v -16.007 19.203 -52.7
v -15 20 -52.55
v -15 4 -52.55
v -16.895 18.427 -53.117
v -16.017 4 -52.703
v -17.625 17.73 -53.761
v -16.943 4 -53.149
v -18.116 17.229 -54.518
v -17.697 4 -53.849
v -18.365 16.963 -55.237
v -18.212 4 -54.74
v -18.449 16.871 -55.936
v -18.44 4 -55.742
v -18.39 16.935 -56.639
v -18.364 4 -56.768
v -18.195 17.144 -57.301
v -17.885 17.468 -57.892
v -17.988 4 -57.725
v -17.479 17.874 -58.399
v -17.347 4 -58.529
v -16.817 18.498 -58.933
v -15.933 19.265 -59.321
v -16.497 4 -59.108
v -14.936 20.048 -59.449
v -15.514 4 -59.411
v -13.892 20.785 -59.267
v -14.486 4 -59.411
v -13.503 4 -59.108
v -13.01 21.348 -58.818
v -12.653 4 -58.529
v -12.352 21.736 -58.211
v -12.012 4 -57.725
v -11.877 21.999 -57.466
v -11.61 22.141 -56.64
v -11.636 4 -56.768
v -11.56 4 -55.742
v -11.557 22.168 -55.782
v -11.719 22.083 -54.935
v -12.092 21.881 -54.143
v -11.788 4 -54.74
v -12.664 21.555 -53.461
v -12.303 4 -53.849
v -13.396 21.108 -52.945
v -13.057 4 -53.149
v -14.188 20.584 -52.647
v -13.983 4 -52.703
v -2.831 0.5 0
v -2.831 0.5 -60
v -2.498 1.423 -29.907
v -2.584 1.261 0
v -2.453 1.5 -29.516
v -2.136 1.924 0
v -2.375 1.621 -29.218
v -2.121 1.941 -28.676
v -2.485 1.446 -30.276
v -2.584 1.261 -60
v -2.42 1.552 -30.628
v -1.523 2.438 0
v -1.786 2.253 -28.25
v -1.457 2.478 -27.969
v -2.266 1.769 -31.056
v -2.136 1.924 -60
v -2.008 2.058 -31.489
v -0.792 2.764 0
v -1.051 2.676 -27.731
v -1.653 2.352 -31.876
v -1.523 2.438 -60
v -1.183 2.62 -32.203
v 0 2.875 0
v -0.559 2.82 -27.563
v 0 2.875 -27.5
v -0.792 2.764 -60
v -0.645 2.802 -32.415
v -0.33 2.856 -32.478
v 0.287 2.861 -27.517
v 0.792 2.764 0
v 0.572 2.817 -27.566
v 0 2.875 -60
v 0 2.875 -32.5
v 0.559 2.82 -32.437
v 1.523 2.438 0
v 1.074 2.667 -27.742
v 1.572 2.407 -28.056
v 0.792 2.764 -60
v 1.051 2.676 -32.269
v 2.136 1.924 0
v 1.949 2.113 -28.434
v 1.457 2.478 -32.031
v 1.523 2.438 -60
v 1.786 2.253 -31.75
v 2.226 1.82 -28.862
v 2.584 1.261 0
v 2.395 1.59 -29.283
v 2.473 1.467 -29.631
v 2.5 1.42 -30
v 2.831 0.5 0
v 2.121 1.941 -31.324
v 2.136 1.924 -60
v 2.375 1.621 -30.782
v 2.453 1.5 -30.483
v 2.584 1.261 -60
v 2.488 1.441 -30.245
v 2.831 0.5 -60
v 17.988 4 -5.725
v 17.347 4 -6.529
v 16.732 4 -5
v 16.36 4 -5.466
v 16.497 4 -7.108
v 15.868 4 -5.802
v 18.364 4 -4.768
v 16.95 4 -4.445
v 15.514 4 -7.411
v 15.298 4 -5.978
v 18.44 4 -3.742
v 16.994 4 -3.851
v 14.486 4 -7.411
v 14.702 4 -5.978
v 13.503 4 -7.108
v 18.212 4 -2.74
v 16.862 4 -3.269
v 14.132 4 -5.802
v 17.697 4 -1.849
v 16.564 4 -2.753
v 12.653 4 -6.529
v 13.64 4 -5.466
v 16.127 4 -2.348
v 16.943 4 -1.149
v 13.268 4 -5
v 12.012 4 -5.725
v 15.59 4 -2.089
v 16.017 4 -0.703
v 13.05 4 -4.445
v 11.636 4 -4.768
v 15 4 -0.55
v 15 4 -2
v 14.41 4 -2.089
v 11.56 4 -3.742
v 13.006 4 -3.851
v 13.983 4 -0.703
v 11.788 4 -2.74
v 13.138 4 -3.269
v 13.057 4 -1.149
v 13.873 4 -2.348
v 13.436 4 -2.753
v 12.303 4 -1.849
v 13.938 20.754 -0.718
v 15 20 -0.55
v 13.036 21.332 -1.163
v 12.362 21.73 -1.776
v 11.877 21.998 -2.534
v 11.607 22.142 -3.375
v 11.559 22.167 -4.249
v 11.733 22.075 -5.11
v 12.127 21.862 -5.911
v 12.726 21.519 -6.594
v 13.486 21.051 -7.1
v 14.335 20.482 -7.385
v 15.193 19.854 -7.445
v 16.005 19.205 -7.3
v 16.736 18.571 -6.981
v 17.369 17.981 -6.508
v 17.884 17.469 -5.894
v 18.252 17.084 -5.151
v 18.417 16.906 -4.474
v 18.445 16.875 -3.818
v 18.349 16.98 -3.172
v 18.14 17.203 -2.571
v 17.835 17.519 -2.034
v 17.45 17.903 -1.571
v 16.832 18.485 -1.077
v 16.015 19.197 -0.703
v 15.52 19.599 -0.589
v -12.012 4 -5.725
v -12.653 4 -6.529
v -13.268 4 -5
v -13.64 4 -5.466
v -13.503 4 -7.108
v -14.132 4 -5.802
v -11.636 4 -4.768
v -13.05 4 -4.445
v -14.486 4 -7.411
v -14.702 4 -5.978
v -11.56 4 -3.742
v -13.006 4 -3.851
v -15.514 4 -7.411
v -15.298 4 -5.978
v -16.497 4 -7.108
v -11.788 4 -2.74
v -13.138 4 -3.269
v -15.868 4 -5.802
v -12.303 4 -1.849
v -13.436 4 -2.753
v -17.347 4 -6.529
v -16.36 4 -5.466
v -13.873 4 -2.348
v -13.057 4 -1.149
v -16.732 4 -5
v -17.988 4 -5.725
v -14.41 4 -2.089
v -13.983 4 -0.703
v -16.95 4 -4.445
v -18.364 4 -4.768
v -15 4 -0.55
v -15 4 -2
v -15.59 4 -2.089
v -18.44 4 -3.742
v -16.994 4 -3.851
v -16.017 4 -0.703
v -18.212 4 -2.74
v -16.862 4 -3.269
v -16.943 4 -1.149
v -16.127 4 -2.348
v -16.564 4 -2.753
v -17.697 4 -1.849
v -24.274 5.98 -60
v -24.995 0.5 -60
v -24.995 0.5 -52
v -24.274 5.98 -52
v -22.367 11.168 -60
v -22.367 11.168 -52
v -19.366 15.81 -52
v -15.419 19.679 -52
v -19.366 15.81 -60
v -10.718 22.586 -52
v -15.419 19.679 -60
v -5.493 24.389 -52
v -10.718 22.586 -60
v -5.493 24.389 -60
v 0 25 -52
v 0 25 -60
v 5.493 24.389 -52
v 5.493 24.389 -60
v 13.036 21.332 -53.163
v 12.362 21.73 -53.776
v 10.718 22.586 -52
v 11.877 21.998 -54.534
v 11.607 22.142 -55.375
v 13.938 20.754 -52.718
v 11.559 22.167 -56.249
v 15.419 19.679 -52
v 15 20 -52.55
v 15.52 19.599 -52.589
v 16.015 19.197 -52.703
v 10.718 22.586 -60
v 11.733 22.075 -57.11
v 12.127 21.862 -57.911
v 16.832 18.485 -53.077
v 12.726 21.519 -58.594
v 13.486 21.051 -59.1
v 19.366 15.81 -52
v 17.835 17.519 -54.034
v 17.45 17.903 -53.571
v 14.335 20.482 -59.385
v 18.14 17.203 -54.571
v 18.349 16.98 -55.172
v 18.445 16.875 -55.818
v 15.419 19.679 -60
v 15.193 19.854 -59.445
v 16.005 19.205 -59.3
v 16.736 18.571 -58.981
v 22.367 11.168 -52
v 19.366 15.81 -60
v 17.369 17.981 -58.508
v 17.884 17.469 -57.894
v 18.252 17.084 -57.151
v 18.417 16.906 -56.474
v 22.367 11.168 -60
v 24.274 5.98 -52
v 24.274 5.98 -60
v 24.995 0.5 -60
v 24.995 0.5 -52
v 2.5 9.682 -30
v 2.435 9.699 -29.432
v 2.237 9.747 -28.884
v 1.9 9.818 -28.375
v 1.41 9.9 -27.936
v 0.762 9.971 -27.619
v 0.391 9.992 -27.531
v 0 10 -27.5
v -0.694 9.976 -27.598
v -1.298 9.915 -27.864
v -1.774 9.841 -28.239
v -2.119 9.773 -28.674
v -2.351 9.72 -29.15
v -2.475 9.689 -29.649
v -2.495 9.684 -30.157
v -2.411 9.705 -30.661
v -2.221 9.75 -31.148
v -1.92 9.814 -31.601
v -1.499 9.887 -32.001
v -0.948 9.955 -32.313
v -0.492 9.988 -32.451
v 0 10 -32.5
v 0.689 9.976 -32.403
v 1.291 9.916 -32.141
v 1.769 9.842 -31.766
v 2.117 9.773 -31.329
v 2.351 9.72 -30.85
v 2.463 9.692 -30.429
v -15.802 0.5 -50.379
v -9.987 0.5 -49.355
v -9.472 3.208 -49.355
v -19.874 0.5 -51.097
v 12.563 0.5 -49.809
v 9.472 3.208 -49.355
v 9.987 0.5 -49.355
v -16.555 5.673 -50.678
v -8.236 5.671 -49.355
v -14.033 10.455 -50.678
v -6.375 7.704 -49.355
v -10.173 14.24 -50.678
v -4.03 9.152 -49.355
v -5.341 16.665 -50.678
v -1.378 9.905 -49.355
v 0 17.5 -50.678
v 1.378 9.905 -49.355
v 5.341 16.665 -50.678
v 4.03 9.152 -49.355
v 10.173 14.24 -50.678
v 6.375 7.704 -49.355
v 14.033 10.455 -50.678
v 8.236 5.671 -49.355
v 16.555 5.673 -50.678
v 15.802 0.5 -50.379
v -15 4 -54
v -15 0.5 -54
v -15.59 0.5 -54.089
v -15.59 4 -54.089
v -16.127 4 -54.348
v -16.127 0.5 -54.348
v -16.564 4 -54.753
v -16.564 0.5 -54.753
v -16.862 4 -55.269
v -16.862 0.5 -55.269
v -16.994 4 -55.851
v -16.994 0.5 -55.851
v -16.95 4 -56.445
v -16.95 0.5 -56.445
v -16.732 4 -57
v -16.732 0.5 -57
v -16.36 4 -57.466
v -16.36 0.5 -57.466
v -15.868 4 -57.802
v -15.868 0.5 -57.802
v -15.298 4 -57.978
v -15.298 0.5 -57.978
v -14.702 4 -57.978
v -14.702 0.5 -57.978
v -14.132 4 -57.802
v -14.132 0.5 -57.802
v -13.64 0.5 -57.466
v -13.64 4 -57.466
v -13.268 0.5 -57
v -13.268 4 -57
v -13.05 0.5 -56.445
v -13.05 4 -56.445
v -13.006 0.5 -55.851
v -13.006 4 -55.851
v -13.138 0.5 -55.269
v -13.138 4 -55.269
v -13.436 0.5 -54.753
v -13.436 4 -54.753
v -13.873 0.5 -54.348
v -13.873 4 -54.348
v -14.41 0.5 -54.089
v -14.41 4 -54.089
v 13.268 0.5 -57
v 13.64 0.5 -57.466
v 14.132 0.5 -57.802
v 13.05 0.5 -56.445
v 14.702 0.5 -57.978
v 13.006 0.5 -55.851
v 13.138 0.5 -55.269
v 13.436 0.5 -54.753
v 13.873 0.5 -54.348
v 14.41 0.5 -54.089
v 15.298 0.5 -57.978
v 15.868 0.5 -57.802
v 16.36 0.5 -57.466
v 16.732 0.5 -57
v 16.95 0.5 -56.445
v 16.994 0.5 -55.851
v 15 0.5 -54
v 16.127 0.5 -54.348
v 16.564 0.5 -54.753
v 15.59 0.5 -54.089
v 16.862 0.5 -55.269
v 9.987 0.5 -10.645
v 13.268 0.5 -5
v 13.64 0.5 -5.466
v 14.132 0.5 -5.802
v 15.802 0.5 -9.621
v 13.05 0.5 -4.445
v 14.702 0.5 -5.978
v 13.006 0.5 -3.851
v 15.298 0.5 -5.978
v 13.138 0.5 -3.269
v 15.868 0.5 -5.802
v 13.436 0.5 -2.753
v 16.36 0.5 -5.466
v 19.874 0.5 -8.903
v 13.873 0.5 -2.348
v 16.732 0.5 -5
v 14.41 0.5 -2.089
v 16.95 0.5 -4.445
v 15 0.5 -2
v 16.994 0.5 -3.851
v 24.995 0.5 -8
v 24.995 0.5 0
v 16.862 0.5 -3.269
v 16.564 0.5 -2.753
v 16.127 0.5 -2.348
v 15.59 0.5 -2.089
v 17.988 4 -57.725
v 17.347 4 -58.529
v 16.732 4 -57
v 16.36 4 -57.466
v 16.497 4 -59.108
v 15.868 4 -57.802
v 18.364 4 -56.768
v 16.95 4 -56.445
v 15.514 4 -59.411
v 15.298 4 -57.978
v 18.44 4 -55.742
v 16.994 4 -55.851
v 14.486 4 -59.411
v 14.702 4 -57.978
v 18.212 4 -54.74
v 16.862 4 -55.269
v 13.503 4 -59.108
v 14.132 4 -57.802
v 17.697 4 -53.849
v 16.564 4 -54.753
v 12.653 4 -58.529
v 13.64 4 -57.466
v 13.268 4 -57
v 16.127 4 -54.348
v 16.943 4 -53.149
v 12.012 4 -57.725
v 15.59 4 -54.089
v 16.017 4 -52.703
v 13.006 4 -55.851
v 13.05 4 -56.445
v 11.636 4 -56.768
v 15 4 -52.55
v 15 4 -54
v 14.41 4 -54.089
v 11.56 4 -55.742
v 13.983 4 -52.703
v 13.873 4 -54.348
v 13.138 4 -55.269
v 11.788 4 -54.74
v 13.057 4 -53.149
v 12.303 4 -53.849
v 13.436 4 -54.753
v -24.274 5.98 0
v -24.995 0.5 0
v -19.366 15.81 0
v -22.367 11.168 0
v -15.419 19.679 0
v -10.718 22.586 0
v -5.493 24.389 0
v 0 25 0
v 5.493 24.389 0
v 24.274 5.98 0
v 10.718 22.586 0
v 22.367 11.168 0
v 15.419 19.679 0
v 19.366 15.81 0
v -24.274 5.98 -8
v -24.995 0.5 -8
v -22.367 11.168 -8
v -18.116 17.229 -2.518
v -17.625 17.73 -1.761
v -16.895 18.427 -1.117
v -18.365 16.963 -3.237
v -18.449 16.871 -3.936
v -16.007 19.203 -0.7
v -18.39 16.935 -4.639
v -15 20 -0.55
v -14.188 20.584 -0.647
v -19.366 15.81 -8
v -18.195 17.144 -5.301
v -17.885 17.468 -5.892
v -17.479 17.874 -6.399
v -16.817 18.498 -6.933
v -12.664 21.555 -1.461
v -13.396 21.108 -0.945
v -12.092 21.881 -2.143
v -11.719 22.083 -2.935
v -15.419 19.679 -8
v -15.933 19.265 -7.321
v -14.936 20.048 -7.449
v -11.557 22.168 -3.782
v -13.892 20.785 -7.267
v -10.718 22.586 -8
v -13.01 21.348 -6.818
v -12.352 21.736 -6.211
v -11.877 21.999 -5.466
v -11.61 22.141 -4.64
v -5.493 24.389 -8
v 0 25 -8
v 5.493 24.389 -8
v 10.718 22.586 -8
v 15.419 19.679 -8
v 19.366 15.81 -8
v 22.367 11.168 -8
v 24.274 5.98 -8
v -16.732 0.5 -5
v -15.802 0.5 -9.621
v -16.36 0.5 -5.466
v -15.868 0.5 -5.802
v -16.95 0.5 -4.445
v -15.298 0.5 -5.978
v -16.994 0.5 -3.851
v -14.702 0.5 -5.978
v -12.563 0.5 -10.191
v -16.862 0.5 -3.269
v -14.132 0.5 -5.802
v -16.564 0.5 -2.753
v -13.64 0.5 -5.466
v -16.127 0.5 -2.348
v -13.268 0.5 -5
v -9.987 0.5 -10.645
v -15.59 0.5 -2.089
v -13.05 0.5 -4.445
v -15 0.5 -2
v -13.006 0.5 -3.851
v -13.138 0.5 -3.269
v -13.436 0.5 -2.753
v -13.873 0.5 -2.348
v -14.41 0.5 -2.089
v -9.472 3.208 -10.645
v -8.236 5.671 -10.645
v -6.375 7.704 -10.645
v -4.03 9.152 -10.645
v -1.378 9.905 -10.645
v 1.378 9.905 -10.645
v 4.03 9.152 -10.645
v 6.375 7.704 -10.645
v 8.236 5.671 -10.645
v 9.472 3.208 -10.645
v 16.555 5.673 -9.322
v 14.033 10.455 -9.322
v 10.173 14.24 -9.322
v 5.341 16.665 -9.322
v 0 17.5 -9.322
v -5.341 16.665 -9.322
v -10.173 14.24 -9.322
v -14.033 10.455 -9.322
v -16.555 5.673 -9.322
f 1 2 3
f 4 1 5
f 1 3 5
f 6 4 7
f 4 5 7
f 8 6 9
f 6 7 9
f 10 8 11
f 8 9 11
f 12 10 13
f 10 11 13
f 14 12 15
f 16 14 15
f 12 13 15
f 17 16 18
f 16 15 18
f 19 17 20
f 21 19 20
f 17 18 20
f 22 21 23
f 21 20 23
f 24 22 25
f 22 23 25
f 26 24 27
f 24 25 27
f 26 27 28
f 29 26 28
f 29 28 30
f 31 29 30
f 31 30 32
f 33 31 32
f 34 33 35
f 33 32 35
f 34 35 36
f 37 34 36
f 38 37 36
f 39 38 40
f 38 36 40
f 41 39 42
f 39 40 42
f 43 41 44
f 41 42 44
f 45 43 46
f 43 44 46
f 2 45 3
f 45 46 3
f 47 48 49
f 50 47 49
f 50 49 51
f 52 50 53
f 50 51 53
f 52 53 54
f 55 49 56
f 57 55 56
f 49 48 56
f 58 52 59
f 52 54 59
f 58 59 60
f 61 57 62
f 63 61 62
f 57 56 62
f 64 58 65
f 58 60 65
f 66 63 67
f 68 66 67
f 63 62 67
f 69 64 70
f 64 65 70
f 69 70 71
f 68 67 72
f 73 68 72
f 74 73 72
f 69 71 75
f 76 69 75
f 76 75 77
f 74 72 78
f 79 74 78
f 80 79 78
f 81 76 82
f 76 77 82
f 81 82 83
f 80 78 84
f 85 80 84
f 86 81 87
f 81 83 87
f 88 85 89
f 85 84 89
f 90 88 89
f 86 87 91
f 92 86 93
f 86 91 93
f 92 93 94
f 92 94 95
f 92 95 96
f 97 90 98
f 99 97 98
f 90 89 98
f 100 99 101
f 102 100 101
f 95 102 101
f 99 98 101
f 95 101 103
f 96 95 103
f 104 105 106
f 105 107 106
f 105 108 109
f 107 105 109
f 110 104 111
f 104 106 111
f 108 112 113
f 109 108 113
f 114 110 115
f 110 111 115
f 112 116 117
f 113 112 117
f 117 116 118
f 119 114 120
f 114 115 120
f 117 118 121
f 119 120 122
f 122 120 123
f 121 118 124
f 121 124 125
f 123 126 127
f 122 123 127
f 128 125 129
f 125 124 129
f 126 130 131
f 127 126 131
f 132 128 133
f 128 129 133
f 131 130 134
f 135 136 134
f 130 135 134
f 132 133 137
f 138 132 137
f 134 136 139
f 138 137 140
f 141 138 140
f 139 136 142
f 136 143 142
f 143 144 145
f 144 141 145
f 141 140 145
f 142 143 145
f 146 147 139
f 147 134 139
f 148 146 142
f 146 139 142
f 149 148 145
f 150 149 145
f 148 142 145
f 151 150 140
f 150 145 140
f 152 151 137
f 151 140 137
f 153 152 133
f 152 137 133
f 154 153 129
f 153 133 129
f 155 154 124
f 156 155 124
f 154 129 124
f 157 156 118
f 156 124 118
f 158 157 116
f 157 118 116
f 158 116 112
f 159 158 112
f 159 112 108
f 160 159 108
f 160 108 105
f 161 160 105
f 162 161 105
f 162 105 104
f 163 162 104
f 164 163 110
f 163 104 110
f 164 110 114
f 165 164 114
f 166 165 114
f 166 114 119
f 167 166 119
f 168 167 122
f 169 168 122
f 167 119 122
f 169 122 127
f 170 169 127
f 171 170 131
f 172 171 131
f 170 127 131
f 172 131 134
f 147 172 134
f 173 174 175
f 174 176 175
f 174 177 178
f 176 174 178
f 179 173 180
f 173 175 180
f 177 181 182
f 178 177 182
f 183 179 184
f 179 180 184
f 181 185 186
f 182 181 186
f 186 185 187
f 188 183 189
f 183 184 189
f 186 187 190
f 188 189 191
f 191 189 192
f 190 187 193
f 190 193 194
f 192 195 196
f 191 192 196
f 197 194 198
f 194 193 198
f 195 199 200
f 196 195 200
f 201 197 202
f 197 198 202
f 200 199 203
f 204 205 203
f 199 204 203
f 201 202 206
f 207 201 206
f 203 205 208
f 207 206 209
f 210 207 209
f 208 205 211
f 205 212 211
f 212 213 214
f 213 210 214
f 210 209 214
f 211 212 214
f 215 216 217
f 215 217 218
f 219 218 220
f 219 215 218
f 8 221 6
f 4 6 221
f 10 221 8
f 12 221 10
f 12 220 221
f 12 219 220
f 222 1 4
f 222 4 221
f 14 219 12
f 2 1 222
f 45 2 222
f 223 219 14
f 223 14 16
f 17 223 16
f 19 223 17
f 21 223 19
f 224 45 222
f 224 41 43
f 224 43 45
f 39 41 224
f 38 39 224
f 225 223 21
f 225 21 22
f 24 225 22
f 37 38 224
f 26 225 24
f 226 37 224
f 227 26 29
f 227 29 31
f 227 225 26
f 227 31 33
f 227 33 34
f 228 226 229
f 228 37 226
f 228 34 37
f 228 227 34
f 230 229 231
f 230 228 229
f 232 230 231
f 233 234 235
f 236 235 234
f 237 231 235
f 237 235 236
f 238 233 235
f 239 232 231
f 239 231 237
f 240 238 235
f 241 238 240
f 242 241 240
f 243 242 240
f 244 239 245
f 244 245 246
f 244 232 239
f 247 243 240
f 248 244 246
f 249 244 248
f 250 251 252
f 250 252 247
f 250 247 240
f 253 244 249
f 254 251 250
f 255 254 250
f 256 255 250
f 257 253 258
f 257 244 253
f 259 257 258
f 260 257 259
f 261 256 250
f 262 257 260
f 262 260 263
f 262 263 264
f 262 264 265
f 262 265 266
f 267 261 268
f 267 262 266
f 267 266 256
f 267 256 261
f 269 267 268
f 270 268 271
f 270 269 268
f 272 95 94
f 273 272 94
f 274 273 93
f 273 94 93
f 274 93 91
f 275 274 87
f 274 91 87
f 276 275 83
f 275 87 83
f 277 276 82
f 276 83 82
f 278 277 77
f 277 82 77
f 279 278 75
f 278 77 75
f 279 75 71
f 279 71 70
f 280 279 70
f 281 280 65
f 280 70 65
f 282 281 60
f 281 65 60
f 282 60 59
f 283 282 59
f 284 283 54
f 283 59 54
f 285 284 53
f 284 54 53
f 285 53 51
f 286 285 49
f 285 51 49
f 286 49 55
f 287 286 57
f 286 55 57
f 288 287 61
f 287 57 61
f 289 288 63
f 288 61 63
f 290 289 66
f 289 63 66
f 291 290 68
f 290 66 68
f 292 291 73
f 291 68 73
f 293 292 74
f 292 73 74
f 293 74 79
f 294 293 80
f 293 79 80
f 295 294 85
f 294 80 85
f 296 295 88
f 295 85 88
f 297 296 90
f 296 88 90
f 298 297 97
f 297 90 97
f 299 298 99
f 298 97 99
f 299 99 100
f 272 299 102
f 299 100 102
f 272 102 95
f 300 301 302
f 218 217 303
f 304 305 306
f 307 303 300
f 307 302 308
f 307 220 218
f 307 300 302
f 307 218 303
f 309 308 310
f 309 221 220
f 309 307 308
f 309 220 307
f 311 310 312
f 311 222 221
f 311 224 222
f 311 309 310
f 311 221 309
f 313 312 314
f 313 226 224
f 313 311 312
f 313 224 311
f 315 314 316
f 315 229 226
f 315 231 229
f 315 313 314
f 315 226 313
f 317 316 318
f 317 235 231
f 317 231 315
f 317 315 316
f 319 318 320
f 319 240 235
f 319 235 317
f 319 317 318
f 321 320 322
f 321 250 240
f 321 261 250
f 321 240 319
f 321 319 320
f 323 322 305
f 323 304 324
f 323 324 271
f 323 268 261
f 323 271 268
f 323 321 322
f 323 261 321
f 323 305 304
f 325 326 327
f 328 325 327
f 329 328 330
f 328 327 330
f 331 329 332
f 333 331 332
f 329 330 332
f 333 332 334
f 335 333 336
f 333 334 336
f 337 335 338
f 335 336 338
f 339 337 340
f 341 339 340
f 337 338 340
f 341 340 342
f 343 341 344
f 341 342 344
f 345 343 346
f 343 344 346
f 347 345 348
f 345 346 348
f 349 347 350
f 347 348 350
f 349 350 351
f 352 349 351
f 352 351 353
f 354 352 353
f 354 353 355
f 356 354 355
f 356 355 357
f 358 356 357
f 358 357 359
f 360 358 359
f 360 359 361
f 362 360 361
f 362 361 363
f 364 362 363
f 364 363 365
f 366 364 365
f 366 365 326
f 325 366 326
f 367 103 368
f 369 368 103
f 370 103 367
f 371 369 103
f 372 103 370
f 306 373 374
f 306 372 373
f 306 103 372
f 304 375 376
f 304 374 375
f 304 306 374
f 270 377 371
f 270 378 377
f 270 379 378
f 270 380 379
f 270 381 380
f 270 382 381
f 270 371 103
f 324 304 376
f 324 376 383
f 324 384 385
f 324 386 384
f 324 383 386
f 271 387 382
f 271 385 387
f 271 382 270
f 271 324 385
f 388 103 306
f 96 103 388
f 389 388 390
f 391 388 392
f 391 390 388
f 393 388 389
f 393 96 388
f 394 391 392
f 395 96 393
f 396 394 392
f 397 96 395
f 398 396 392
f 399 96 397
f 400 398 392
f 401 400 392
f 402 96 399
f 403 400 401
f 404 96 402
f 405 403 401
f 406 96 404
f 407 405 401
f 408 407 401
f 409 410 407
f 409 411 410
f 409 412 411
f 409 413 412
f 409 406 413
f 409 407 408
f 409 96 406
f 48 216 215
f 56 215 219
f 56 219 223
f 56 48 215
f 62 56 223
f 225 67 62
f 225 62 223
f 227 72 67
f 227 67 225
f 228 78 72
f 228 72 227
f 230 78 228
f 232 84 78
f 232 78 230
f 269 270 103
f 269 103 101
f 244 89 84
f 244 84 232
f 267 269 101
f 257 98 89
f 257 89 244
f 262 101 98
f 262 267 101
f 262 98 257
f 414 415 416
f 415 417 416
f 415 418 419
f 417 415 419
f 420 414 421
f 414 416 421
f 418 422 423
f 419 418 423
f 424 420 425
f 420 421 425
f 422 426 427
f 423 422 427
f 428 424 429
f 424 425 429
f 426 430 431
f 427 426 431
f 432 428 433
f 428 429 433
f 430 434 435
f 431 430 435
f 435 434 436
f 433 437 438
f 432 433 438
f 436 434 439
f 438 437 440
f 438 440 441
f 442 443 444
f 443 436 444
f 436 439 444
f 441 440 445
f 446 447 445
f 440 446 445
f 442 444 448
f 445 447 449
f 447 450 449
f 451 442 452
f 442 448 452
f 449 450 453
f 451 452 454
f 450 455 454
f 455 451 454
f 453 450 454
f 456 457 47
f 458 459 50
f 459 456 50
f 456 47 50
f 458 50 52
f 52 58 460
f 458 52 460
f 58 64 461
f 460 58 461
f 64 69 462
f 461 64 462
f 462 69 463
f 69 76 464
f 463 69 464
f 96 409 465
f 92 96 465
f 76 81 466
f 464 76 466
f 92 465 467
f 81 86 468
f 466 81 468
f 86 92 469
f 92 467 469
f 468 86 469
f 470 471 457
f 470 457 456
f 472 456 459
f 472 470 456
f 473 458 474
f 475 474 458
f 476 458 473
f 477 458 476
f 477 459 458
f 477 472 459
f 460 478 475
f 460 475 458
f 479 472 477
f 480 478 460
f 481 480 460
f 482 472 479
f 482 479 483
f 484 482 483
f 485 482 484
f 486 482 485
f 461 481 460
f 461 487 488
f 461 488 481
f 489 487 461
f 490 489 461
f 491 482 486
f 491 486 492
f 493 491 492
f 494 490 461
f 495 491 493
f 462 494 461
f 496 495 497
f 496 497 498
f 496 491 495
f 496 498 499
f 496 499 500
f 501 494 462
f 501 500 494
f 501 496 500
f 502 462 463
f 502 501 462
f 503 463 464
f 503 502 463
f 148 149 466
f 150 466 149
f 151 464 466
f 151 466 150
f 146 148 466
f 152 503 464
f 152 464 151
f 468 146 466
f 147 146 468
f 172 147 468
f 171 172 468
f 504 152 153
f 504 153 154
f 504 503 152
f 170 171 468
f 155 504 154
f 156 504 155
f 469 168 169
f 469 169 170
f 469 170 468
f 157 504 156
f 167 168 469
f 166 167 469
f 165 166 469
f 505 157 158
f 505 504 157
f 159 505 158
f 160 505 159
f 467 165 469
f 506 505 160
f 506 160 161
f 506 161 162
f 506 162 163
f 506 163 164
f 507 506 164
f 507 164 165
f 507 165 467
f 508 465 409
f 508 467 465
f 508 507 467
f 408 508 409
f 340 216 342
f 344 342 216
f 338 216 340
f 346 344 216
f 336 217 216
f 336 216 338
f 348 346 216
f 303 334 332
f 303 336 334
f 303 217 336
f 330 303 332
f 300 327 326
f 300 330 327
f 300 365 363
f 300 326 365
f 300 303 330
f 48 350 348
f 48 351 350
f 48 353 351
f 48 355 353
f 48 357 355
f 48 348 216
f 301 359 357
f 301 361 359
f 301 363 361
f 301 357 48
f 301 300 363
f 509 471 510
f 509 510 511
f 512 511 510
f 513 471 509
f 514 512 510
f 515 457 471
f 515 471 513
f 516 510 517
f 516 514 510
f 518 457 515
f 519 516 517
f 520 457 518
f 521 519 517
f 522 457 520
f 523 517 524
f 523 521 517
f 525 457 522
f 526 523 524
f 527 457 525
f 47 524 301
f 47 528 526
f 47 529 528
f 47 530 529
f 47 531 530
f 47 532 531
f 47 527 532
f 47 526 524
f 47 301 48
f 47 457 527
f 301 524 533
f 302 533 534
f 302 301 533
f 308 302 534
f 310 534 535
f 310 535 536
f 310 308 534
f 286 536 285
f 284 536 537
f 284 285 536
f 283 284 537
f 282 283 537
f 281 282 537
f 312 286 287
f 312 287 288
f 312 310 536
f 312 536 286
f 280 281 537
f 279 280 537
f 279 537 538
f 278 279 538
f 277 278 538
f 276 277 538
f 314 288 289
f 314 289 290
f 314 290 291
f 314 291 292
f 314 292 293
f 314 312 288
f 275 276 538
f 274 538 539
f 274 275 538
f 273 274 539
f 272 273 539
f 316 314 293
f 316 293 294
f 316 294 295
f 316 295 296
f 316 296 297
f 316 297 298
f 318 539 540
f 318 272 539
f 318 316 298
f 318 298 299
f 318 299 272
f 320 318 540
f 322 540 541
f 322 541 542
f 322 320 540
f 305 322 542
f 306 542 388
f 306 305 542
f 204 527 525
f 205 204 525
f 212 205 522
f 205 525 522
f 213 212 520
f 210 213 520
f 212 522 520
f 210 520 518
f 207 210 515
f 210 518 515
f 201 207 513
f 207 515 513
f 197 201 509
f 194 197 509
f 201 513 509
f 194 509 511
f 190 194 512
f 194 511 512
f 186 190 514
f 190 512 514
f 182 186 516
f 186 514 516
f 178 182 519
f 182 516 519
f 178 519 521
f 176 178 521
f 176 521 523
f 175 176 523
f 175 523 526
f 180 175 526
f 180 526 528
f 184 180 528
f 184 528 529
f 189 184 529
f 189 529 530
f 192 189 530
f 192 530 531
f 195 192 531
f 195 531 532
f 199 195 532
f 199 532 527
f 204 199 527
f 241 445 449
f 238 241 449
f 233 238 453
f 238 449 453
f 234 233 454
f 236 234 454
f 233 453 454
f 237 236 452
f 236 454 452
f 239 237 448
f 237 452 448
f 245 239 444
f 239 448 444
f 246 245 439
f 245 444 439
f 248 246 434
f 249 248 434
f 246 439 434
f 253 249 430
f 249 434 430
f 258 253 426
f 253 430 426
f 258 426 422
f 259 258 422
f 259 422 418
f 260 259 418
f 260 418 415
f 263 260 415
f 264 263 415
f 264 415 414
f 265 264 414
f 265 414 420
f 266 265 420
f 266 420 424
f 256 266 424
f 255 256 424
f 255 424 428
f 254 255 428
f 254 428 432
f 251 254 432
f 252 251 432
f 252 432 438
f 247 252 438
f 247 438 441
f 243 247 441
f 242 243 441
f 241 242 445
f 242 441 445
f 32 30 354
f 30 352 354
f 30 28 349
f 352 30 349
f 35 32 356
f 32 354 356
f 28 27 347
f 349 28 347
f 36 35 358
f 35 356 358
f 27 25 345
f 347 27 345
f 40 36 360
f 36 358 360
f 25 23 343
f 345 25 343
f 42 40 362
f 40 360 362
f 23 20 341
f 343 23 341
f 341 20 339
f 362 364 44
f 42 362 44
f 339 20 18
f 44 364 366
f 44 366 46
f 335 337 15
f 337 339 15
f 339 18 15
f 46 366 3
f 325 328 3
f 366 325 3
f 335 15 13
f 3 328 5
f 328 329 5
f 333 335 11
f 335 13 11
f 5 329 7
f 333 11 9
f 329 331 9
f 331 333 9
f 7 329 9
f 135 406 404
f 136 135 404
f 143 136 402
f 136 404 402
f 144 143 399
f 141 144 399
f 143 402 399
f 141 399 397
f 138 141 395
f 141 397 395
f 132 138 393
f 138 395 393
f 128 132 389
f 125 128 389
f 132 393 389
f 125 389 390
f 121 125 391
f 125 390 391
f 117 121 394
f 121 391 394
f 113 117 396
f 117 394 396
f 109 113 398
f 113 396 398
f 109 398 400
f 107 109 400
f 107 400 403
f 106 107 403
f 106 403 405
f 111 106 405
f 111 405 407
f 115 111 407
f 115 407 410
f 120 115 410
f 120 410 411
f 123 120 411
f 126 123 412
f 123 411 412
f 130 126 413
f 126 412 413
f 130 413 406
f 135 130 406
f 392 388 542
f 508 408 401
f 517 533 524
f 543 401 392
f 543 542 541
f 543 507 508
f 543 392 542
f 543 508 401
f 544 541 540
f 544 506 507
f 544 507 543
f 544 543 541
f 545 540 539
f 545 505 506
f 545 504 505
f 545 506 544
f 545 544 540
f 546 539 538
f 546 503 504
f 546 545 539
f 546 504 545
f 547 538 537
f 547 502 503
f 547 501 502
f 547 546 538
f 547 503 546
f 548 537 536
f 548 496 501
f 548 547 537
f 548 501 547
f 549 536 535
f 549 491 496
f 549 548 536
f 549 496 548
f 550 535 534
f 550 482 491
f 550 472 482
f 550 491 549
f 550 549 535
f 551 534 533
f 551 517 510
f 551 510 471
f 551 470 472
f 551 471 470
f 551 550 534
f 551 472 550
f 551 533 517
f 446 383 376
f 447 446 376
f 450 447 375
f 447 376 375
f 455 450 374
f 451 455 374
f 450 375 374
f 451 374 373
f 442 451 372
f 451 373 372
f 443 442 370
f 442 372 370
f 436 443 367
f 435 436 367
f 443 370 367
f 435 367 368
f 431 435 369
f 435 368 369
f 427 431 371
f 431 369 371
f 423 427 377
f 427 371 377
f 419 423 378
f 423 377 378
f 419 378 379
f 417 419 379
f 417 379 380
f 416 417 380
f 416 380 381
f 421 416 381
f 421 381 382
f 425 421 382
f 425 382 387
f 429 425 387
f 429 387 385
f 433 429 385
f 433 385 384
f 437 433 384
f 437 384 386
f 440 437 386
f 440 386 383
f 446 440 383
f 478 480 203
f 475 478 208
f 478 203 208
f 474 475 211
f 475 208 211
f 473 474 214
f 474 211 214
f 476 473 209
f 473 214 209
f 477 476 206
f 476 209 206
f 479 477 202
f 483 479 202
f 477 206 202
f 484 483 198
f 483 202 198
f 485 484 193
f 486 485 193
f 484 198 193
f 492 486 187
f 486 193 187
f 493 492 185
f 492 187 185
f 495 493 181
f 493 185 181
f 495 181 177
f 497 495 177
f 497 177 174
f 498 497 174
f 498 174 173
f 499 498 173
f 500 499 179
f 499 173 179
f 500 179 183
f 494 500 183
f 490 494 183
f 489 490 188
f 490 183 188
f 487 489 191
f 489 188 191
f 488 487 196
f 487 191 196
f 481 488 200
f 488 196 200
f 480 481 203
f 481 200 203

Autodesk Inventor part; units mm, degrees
ref_plane "YZ Plane" through (0, 0, 0) normal (1, 0, 0) x (0, 1, 0)
ref_plane "XZ Plane" through (0, 0, 0) normal (0, 1, 0) x (-1, 0, 0)
sketch "Esquisse1" plane through (0, 0, 0) normal (1, 0, 0) x (0, 1, 0)
  line L0 (0, 0) -> (0, -46.4485)
  line L1 (2.875, 0) -> (25, 0)
  line L2 (25, 0) -> (25, -8)
  line L3 (2.875, 0) -> (2.875, -60)
  line L4 (25, -8) -> (10, -10.6449)
  line L5 (10, -10.6449) -> (10, -49.3551)
  line L6 (10, -49.3551) -> (25, -52)
  line L7 (25, -52) -> (25, -60)
  line L8 (2.875, -60) -> (25, -60)
  dimension "d0" = 5.75
  dimension "d1" = 50
  dimension "d2" = 20
  dimension "d3" = 100
  dimension "d4" = 8
  dimension "d5" = 100
  dimension "d6" = 60
  dimension "d7" = 15
  dimension "d8" = 38.7102
revolve "Révolution1" add sketch "Esquisse1" angle 360 about axis through (0, 0, 0) along (0, 0, -1)
sketch "Esquisse2" plane through (0, 0, 0) normal (0, 0, 1) x (1, 0, 0)
  circle A0 centre (0, 0) radius 25 projected
  line L0 (-25, 0.5) -> (25, 0.5)
  line L1 (25, 0.5) -> (25, -25)
  line L2 (25, -25) -> (-25, -25)
  line L3 (-25, -25) -> (-25, 0.5)
  point P0 (-25, 0)
  point P1 (25, 0)
  dimension "d42" = 0.5
extrude "Extrusion1" cut sketch "Esquisse2" against normal up to surface (60 mm away) contours A0 L0 | L1 L2 A0 | A0 L0 L1 | L2 L3 A0 | A0 L3 L0 picked at (-6.5153, -4.8624)
sketch "Esquisse3" plane through (-25, 0.5, 0) normal (0, -1, 0) x (1, 0, 0)
  line L0 (0, -52) -> (15, -49.3551) projected
  line L1 (0, -60) -> (0, -52) projected
  line L2 (22.125, -60) -> (0, -60) projected
  line L3 (22.125, 0) -> (22.125, -60) projected
  line L4 (0, 0) -> (22.125, 0) projected
  line L5 (0, -8) -> (0, 0) projected
  line L6 (15, -10.6449) -> (0, -8) projected
  line L7 (15, -49.3551) -> (15, -10.6449) projected
  line L8 (35, -49.3551) -> (50, -52) projected
  line L9 (35, -10.6449) -> (35, -49.3551) projected
  line L10 (50, -8) -> (35, -10.6449) projected
  line L11 (50, 0) -> (50, -8) projected
  line L12 (27.875, 0) -> (50, 0) projected
  line L13 (27.875, -60) -> (27.875, 0) projected
  line L14 (50, -60) -> (27.875, -60) projected
  line L15 (50, -52) -> (50, -60) projected
  line L16 (22.1688, -60) -> (27.8312, -60) projected
  line L17 (22.1688, 0) -> (27.8312, 0) projected
  circle A0 centre (25, -30) radius 2.5
  line L18 (27.8312, -60) -> (27.8312, 0) projected
  line L19 (22.1688, 0) -> (22.1688, -60) projected
  point P0 (25, 0)
  point P1 (22.125, 0)
  point P2 (27.875, 0)
  point P3 (25, 0)
  dimension "d13" = 60
  dimension "d14" = 30
  dimension "d15" = 5
extrude "Extrusion2" cut sketch "Esquisse3" against normal up to surface contours A0
ref_plane "Plan de construction2" through (0, 25, -60) normal (0, 1, 0) x (-1, 0, 0)
sketch "Esquisse6" plane through (0, 25, -60) normal (0, 1, 0) x (-1, 0, 0)
  line L0 (24.995, 0) -> (-24.995, 0) projected
  line L1 (24.995, 8) -> (-24.995, 8) projected
  line L2 (24.995, 52) -> (-24.995, 52) projected
  line L3 (24.995, 60) -> (-24.995, 60) projected
  line L4 (-24.995, 60) -> (-24.995, 52) projected
  line L5 (24.995, 52) -> (24.995, 60) projected
  line L6 (-24.995, 8) -> (-24.995, 0) projected
  line L7 (24.995, 0) -> (24.995, 8) projected
  point P0 (0, 60)
  point P1 (25, 8)
  point P2 (25, 0)
  point P3 (-25, 0)
  point P4 (-25, 8)
  point P5 (25, 60)
  point P6 (25, 52)
  point P7 (-25, 52)
  point P8 (-25, 60)
  point P9 (-15, 4)
  point P10 (15, 4)
  point P11 (15, 56)
  point P12 (-15, 56)
  dimension "d31" = 8
  dimension "d32" = 4
  dimension "d33" = 4
hole "Perçage2" at (15, 25, -56) at (-15, 25, -56) at (-15, 25, -4) at (15, 25, -4) direction (0, -1, 0) diameter 4 end through all counterbore diameter 6.9 counterbore depth 21
equation "\"d5\" = d3"
equation "\"d14\" = 0.5 * d13"
equation "\"d32\" = 0.5 * d31"
equation "\"d33\" = d32"
properties part number "demi_tambour"
